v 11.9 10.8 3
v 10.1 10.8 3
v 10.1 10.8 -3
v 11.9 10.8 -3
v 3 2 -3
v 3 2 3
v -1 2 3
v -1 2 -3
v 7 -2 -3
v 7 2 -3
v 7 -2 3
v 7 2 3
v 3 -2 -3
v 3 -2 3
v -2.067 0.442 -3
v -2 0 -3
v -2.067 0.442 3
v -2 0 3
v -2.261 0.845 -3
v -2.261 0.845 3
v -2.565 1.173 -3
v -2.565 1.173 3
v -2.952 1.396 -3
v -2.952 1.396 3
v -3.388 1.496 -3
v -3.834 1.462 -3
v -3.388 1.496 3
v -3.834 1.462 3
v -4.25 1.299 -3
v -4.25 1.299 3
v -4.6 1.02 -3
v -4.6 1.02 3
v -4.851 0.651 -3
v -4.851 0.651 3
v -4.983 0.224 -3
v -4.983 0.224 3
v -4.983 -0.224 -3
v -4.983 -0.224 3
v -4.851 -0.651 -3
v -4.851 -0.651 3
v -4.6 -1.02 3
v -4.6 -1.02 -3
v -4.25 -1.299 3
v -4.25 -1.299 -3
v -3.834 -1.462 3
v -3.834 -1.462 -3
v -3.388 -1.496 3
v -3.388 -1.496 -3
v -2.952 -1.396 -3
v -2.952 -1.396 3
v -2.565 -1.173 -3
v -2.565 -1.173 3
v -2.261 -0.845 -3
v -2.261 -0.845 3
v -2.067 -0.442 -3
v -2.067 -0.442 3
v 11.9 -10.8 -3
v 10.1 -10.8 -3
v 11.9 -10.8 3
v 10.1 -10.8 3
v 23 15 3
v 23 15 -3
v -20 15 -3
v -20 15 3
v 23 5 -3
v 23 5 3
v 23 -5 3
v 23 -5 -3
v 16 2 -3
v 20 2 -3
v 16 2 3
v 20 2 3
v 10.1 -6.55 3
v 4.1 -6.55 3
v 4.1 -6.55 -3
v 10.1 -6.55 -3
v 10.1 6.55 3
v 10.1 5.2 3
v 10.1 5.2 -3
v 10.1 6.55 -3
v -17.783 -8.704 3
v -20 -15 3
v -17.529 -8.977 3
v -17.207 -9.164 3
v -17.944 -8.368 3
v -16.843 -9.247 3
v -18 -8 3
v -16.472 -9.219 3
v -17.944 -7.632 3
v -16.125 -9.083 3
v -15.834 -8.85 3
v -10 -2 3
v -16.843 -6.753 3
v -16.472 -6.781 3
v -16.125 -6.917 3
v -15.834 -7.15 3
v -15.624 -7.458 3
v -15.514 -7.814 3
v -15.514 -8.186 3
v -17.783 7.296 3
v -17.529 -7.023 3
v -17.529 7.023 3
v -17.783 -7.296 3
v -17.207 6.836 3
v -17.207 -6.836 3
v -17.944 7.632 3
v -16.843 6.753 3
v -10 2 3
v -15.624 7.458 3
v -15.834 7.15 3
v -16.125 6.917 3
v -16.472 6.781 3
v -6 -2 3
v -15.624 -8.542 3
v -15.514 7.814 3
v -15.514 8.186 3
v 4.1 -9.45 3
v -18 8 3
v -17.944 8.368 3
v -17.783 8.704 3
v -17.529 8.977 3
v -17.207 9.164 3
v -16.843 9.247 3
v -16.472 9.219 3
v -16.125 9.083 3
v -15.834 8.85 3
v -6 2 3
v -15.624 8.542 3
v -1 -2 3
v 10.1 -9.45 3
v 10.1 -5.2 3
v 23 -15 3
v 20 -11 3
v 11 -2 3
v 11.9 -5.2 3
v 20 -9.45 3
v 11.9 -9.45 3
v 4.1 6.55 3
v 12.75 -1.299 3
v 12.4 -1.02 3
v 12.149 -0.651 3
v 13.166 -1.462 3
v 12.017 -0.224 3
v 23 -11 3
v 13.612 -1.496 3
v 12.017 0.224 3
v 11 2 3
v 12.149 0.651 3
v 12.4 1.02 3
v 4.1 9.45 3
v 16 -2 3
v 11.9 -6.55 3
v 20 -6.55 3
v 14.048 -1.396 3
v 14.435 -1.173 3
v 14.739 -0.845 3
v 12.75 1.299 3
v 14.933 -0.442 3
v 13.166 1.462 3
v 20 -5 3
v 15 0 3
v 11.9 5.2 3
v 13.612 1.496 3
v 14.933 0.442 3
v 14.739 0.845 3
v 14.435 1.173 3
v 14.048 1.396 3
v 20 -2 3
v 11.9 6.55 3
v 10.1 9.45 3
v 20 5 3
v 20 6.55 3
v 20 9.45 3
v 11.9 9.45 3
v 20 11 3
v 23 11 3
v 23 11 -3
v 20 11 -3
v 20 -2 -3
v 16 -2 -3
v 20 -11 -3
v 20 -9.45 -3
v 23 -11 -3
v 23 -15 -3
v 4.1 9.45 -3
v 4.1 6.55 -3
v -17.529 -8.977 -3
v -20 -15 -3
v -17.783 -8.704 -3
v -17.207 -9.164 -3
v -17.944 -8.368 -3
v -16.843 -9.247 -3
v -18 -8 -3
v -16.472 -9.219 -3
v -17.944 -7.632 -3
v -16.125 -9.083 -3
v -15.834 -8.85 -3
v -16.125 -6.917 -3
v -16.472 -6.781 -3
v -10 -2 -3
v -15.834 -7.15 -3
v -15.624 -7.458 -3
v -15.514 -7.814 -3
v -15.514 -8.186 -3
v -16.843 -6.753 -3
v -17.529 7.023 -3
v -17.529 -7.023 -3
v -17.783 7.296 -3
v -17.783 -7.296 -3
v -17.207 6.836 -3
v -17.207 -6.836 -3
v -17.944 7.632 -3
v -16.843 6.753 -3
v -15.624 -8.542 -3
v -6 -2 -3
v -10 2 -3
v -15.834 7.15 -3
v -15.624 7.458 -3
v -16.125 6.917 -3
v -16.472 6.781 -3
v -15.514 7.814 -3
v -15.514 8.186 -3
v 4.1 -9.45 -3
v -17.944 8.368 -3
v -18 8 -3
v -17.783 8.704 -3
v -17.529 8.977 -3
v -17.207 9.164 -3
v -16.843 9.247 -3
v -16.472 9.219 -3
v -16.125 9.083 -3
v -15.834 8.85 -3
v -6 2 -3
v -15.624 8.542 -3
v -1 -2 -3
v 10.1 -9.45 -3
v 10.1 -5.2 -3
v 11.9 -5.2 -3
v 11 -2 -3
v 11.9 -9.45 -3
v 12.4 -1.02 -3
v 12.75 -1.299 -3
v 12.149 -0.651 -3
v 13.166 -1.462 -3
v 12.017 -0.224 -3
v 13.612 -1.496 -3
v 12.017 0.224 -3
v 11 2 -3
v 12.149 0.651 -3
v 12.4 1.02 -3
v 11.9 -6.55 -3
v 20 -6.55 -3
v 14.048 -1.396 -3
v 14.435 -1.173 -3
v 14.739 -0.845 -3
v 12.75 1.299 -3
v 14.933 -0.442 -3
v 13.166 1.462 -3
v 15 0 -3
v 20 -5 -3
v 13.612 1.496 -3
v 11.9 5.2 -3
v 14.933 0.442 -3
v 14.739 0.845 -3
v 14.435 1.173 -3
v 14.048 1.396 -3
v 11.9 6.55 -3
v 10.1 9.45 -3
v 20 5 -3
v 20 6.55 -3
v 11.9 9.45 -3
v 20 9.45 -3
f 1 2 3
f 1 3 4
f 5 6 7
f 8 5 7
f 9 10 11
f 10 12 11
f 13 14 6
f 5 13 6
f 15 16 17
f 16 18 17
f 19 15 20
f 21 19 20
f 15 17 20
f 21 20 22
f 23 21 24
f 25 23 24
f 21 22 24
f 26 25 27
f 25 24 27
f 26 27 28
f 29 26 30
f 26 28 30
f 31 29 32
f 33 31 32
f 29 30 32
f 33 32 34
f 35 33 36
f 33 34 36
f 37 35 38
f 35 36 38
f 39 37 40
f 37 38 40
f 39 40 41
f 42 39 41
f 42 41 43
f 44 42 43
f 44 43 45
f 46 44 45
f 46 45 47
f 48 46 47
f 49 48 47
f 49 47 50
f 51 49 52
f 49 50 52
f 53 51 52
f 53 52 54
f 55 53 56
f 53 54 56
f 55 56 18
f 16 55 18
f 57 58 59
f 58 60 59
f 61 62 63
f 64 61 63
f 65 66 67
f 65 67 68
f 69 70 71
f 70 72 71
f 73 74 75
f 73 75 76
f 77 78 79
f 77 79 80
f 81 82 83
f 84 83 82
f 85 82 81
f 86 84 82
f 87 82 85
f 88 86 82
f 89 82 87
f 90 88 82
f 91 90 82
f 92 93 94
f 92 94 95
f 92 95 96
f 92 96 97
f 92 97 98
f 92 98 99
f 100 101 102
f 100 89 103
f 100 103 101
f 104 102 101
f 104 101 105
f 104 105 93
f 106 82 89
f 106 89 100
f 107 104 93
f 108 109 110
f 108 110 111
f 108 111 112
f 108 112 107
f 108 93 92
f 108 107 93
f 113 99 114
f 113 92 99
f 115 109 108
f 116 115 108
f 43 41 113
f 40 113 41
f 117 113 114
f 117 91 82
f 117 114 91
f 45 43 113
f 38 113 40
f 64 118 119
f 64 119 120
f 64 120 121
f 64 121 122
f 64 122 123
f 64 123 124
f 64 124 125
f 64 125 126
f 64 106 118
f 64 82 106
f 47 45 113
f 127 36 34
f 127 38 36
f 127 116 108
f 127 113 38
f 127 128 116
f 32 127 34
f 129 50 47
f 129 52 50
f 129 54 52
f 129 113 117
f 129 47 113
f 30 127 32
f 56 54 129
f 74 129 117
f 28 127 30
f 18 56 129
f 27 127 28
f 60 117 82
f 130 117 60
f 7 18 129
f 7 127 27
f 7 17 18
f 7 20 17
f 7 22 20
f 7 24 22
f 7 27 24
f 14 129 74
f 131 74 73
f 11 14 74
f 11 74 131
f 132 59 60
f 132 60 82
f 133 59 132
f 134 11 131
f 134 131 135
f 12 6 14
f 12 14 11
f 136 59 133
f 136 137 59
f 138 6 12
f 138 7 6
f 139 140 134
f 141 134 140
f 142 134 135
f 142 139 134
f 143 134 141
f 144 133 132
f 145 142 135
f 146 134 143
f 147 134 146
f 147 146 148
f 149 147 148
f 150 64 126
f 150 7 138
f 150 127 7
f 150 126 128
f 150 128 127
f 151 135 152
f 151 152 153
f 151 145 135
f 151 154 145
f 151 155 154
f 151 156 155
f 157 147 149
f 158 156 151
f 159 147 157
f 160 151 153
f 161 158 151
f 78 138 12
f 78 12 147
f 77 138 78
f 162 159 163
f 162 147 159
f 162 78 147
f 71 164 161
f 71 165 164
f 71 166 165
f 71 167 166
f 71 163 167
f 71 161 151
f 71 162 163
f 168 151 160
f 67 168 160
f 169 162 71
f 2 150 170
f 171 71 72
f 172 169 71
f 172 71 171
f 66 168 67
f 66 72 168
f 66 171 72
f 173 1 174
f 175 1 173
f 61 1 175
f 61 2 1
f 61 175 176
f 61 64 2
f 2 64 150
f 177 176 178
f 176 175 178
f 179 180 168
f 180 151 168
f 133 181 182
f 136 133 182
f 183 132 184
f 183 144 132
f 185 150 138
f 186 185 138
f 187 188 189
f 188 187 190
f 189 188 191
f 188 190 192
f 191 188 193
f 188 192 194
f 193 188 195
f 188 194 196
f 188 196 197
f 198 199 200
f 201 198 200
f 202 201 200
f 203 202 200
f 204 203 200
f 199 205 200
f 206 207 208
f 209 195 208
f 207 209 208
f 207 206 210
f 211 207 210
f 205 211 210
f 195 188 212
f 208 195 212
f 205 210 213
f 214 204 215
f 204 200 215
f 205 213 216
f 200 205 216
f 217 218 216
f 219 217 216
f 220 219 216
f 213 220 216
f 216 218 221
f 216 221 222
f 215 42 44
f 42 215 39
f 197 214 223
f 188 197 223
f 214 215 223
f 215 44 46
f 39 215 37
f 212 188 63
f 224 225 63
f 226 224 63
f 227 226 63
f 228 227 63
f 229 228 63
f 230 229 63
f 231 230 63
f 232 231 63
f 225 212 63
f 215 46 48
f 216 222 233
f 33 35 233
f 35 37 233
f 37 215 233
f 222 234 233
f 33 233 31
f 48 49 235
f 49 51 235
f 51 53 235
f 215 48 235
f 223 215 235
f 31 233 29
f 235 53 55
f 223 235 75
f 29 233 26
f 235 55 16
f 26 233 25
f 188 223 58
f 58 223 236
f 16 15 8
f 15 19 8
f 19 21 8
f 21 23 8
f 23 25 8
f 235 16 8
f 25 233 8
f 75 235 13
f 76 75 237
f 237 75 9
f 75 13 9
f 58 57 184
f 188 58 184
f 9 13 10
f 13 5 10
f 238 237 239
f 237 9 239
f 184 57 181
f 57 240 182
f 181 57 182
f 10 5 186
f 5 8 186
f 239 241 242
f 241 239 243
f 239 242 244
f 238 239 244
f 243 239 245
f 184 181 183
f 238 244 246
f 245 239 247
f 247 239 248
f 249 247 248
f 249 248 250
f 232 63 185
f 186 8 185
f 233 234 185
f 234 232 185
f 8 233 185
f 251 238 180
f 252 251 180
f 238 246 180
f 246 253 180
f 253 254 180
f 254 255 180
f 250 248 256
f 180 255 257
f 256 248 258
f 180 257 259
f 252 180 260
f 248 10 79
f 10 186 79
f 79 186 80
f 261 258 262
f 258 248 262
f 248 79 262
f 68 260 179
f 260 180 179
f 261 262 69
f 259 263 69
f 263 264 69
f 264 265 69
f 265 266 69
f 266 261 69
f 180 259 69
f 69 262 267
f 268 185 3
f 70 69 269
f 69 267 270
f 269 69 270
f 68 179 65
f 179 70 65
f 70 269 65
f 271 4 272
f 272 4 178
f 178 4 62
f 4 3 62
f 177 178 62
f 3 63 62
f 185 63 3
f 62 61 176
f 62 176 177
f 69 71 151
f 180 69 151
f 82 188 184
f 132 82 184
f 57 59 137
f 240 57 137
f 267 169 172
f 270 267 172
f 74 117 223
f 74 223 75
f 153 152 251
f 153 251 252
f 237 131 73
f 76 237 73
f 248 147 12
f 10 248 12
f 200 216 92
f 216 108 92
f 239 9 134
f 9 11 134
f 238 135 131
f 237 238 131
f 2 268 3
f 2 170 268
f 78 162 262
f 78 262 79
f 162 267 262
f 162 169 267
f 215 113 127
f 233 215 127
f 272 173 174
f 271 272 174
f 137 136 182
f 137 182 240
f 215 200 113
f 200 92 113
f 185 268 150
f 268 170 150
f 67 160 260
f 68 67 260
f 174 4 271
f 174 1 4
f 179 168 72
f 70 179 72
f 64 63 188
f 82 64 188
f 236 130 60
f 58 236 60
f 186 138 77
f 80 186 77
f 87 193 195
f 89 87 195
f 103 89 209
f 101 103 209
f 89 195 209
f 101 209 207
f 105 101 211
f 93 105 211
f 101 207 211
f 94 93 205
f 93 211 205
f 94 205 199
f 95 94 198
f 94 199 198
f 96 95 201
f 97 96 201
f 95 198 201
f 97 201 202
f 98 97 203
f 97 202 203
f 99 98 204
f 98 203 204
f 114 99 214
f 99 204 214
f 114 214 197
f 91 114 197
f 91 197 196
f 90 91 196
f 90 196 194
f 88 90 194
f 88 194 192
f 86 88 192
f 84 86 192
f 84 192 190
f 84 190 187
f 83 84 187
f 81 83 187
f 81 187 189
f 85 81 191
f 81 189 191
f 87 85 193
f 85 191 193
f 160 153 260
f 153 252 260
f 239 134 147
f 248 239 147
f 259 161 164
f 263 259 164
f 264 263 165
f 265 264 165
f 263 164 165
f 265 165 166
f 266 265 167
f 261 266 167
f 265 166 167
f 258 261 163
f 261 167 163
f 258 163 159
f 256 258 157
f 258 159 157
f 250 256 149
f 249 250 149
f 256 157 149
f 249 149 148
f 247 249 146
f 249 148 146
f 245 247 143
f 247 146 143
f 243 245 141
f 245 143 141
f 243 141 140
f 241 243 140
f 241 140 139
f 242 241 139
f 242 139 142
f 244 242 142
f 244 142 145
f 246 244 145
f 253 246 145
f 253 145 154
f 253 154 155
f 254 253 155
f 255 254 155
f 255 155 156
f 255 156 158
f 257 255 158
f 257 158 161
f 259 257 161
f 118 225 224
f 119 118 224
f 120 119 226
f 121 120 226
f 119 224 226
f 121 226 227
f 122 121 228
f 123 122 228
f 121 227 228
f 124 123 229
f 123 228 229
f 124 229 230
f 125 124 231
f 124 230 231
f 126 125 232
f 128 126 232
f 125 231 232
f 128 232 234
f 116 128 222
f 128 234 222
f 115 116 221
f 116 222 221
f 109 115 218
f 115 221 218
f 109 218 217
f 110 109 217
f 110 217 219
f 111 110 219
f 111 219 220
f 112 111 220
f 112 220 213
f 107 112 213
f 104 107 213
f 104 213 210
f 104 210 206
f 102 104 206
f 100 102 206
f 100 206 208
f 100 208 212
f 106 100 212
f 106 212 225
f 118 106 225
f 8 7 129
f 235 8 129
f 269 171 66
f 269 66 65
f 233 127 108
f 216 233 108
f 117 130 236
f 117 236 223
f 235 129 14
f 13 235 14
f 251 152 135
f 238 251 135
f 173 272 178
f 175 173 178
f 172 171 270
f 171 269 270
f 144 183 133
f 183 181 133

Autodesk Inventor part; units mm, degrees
sketch "Эскиз1" plane through (0, 0, 0) normal (0, 0, 1) x (1, 0, 0)
  line L0 (-20, -15) -> (20, -15)
  line L1 (20, -15) -> (20, 15)
  line L2 (20, 15) -> (-20, 15)
  line L3 (-20, 15) -> (-20, -15)
  line L4 (-20, -15) -> (20, 15) construction
  line L5 (20, -15) -> (-20, 15) construction
  point P0 (0, 0)
  dimension "d0" = 40
  dimension "d1" = 30
extrude "Выдавливание1" add sketch "Эскиз1" along normal mid plane 6
sketch "Эскиз2" plane through (0, 0, -3) normal (0, 0, -1) x (-1, 0, 0)
  circle A0 centre (16.75, 8) radius 1.25 projected
  circle A1 centre (16.75, -8) radius 1.25 projected
  point P0 (0, 0)
extrude "Выдавливание2" cut sketch "Эскиз2" against normal up to surface (6 mm away)
sketch "Эскиз3" plane through (20, -15, 3) normal (1, 0, 0) x (0, 0, -1)
  line L0 (0, 0) -> (0, 30) projected
  line L1 (6, 0) -> (6, 30) projected
  line L2 (0, 0) -> (6, 0)
  line L3 (6, 0) -> (6, 4)
  line L4 (6, 4) -> (0, 4)
  line L5 (0, 4) -> (0, 0)
  line L6 (0, 26) -> (6, 26)
  line L7 (6, 26) -> (6, 30)
  line L8 (6, 30) -> (0, 30)
  line L9 (0, 30) -> (0, 26)
  line L10 (6, 30) -> (6, 0) projected
  line L11 (0, 10) -> (6, 10)
  line L12 (6, 10) -> (6, 15)
  line L13 (0, 15) -> (0, 10)
  line L14 (0, 20) -> (6, 20)
  line L15 (6, 20) -> (6, 15)
  line L16 (0, 15) -> (0, 20)
  point P0 (3, 15)
  point P1 (0, 4)
  point P2 (0, 26)
  point P3 (6, 26)
  point P4 (6, 10)
  dimension "d6" = 4
  dimension "d7" = 4
extrude "Выдавливание3" add sketch "Эскиз3" along normal blind 3 contours L0 L4 L1 L2 | L0 L14 L1 L11 | L0 L8 L1 L6
sketch "Эскиз4" plane through (0, 0, 3) normal (0, 0, 1) x (1, 0, 0)
  line L0 (20, 6.55) -> (20, 9.45)
  line L1 (4.1, 9.45) -> (4.1, 6.55)
  line L2 (10.1, 10.8) -> (11.9, 10.8)
  line L3 (11.9, 5.2) -> (10.1, 5.2)
  line L4 (20, 9.45) -> (11.9, 9.45)
  line L5 (10.1, 9.45) -> (4.1, 9.45)
  line L6 (10.1, 5.2) -> (10.1, 6.55)
  line L7 (10.1, 9.45) -> (10.1, 10.8)
  line L8 (11.9, 10.8) -> (11.9, 9.45)
  line L9 (11.9, 6.55) -> (11.9, 5.2)
  line L10 (4.1, 6.55) -> (10.1, 6.55)
  line L11 (11.9, 6.55) -> (20, 6.55)
  line L12 (20, 5) -> (20, 11) projected
  line L13 (1.3154, 0) -> (2.8284, 0) construction
  line L14 (20, -6.55) -> (20, -9.45)
  line L15 (4.1, -9.45) -> (4.1, -6.55)
  line L16 (10.1, -10.8) -> (11.9, -10.8)
  line L17 (11.9, -5.2) -> (10.1, -5.2)
  line L18 (20, -9.45) -> (11.9, -9.45)
  line L19 (10.1, -9.45) -> (4.1, -9.45)
  line L20 (10.1, -5.2) -> (10.1, -6.55)
  line L21 (10.1, -9.45) -> (10.1, -10.8)
  line L22 (11.9, -10.8) -> (11.9, -9.45)
  line L23 (11.9, -6.55) -> (11.9, -5.2)
  line L24 (4.1, -6.55) -> (10.1, -6.55)
  line L25 (11.9, -6.55) -> (20, -6.55)
  point P0 (0, 0)
  point P1 (20, 0)
  point P2 (20, 8)
  dimension "d10" = 2.9
  dimension "d11" = 1.8
  dimension "d12" = 5.6
  dimension "d14" = 1.35
  dimension "d15" = 6
  dimension "d16" = 8.1
extrude "Выдавливание4" cut sketch "Эскиз4" against normal up to surface (6 mm away)
sketch "Эскиз5" plane through (0, 0, 3) normal (0, 0, 1) x (1, 0, 0)
  line L0 (-6, 2) -> (-10, 2) projected
  line L1 (-10, 2) -> (-10, -2) projected
  line L2 (-10, -2) -> (-6, -2) projected
  line L3 (-6, -2) -> (-6, 2) projected
  line L4 (-1, 2) -> (-1, -2) projected
  line L5 (-1, -2) -> (3, -2) projected
  line L6 (3, -2) -> (3, 2) projected
  line L7 (3, 2) -> (-1, 2) projected
  line L8 (7, 2) -> (7, -2) projected
  line L9 (11, 2) -> (7, 2) projected
  line L10 (7, -2) -> (11, -2) projected
  line L11 (11, -2) -> (11, 2) projected
  line L12 (16, 2) -> (16, -2) projected
  line L13 (20, 2) -> (16, 2) projected
  line L14 (16, -2) -> (20, -2) projected
  line L15 (20, -2) -> (20, 2) projected
  point P0 (0, 0)
extrude "Выдавливание5" cut sketch "Эскиз5" against normal up to surface (6 mm away)
sketch "Эскиз6" plane through (0, 0, 3) normal (0, 0, 1) x (1, 0, 0)
  circle A0 centre (-3.5, 0) radius 1.5
  circle A1 centre (13.5, 0) radius 1.5
  line L0 (-6, 2) -> (-6, -2) projected
  line L1 (-1, -2) -> (-1, 2) projected
  line L2 (11, 2) -> (11, -2) projected
  line L3 (16, -2) -> (16, 2) projected
  line L4 (-6, 0) -> (-1, 0) construction
  line L5 (11, 0) -> (16, 0) construction
  point P0 (0, 0)
  point P1 (-3.5, 0)
  point P2 (13.5, 0)
  dimension "d25" = 3
extrude "Выдавливание6" cut sketch "Эскиз6" against normal up to surface (6 mm away)
properties part number "крыло"
